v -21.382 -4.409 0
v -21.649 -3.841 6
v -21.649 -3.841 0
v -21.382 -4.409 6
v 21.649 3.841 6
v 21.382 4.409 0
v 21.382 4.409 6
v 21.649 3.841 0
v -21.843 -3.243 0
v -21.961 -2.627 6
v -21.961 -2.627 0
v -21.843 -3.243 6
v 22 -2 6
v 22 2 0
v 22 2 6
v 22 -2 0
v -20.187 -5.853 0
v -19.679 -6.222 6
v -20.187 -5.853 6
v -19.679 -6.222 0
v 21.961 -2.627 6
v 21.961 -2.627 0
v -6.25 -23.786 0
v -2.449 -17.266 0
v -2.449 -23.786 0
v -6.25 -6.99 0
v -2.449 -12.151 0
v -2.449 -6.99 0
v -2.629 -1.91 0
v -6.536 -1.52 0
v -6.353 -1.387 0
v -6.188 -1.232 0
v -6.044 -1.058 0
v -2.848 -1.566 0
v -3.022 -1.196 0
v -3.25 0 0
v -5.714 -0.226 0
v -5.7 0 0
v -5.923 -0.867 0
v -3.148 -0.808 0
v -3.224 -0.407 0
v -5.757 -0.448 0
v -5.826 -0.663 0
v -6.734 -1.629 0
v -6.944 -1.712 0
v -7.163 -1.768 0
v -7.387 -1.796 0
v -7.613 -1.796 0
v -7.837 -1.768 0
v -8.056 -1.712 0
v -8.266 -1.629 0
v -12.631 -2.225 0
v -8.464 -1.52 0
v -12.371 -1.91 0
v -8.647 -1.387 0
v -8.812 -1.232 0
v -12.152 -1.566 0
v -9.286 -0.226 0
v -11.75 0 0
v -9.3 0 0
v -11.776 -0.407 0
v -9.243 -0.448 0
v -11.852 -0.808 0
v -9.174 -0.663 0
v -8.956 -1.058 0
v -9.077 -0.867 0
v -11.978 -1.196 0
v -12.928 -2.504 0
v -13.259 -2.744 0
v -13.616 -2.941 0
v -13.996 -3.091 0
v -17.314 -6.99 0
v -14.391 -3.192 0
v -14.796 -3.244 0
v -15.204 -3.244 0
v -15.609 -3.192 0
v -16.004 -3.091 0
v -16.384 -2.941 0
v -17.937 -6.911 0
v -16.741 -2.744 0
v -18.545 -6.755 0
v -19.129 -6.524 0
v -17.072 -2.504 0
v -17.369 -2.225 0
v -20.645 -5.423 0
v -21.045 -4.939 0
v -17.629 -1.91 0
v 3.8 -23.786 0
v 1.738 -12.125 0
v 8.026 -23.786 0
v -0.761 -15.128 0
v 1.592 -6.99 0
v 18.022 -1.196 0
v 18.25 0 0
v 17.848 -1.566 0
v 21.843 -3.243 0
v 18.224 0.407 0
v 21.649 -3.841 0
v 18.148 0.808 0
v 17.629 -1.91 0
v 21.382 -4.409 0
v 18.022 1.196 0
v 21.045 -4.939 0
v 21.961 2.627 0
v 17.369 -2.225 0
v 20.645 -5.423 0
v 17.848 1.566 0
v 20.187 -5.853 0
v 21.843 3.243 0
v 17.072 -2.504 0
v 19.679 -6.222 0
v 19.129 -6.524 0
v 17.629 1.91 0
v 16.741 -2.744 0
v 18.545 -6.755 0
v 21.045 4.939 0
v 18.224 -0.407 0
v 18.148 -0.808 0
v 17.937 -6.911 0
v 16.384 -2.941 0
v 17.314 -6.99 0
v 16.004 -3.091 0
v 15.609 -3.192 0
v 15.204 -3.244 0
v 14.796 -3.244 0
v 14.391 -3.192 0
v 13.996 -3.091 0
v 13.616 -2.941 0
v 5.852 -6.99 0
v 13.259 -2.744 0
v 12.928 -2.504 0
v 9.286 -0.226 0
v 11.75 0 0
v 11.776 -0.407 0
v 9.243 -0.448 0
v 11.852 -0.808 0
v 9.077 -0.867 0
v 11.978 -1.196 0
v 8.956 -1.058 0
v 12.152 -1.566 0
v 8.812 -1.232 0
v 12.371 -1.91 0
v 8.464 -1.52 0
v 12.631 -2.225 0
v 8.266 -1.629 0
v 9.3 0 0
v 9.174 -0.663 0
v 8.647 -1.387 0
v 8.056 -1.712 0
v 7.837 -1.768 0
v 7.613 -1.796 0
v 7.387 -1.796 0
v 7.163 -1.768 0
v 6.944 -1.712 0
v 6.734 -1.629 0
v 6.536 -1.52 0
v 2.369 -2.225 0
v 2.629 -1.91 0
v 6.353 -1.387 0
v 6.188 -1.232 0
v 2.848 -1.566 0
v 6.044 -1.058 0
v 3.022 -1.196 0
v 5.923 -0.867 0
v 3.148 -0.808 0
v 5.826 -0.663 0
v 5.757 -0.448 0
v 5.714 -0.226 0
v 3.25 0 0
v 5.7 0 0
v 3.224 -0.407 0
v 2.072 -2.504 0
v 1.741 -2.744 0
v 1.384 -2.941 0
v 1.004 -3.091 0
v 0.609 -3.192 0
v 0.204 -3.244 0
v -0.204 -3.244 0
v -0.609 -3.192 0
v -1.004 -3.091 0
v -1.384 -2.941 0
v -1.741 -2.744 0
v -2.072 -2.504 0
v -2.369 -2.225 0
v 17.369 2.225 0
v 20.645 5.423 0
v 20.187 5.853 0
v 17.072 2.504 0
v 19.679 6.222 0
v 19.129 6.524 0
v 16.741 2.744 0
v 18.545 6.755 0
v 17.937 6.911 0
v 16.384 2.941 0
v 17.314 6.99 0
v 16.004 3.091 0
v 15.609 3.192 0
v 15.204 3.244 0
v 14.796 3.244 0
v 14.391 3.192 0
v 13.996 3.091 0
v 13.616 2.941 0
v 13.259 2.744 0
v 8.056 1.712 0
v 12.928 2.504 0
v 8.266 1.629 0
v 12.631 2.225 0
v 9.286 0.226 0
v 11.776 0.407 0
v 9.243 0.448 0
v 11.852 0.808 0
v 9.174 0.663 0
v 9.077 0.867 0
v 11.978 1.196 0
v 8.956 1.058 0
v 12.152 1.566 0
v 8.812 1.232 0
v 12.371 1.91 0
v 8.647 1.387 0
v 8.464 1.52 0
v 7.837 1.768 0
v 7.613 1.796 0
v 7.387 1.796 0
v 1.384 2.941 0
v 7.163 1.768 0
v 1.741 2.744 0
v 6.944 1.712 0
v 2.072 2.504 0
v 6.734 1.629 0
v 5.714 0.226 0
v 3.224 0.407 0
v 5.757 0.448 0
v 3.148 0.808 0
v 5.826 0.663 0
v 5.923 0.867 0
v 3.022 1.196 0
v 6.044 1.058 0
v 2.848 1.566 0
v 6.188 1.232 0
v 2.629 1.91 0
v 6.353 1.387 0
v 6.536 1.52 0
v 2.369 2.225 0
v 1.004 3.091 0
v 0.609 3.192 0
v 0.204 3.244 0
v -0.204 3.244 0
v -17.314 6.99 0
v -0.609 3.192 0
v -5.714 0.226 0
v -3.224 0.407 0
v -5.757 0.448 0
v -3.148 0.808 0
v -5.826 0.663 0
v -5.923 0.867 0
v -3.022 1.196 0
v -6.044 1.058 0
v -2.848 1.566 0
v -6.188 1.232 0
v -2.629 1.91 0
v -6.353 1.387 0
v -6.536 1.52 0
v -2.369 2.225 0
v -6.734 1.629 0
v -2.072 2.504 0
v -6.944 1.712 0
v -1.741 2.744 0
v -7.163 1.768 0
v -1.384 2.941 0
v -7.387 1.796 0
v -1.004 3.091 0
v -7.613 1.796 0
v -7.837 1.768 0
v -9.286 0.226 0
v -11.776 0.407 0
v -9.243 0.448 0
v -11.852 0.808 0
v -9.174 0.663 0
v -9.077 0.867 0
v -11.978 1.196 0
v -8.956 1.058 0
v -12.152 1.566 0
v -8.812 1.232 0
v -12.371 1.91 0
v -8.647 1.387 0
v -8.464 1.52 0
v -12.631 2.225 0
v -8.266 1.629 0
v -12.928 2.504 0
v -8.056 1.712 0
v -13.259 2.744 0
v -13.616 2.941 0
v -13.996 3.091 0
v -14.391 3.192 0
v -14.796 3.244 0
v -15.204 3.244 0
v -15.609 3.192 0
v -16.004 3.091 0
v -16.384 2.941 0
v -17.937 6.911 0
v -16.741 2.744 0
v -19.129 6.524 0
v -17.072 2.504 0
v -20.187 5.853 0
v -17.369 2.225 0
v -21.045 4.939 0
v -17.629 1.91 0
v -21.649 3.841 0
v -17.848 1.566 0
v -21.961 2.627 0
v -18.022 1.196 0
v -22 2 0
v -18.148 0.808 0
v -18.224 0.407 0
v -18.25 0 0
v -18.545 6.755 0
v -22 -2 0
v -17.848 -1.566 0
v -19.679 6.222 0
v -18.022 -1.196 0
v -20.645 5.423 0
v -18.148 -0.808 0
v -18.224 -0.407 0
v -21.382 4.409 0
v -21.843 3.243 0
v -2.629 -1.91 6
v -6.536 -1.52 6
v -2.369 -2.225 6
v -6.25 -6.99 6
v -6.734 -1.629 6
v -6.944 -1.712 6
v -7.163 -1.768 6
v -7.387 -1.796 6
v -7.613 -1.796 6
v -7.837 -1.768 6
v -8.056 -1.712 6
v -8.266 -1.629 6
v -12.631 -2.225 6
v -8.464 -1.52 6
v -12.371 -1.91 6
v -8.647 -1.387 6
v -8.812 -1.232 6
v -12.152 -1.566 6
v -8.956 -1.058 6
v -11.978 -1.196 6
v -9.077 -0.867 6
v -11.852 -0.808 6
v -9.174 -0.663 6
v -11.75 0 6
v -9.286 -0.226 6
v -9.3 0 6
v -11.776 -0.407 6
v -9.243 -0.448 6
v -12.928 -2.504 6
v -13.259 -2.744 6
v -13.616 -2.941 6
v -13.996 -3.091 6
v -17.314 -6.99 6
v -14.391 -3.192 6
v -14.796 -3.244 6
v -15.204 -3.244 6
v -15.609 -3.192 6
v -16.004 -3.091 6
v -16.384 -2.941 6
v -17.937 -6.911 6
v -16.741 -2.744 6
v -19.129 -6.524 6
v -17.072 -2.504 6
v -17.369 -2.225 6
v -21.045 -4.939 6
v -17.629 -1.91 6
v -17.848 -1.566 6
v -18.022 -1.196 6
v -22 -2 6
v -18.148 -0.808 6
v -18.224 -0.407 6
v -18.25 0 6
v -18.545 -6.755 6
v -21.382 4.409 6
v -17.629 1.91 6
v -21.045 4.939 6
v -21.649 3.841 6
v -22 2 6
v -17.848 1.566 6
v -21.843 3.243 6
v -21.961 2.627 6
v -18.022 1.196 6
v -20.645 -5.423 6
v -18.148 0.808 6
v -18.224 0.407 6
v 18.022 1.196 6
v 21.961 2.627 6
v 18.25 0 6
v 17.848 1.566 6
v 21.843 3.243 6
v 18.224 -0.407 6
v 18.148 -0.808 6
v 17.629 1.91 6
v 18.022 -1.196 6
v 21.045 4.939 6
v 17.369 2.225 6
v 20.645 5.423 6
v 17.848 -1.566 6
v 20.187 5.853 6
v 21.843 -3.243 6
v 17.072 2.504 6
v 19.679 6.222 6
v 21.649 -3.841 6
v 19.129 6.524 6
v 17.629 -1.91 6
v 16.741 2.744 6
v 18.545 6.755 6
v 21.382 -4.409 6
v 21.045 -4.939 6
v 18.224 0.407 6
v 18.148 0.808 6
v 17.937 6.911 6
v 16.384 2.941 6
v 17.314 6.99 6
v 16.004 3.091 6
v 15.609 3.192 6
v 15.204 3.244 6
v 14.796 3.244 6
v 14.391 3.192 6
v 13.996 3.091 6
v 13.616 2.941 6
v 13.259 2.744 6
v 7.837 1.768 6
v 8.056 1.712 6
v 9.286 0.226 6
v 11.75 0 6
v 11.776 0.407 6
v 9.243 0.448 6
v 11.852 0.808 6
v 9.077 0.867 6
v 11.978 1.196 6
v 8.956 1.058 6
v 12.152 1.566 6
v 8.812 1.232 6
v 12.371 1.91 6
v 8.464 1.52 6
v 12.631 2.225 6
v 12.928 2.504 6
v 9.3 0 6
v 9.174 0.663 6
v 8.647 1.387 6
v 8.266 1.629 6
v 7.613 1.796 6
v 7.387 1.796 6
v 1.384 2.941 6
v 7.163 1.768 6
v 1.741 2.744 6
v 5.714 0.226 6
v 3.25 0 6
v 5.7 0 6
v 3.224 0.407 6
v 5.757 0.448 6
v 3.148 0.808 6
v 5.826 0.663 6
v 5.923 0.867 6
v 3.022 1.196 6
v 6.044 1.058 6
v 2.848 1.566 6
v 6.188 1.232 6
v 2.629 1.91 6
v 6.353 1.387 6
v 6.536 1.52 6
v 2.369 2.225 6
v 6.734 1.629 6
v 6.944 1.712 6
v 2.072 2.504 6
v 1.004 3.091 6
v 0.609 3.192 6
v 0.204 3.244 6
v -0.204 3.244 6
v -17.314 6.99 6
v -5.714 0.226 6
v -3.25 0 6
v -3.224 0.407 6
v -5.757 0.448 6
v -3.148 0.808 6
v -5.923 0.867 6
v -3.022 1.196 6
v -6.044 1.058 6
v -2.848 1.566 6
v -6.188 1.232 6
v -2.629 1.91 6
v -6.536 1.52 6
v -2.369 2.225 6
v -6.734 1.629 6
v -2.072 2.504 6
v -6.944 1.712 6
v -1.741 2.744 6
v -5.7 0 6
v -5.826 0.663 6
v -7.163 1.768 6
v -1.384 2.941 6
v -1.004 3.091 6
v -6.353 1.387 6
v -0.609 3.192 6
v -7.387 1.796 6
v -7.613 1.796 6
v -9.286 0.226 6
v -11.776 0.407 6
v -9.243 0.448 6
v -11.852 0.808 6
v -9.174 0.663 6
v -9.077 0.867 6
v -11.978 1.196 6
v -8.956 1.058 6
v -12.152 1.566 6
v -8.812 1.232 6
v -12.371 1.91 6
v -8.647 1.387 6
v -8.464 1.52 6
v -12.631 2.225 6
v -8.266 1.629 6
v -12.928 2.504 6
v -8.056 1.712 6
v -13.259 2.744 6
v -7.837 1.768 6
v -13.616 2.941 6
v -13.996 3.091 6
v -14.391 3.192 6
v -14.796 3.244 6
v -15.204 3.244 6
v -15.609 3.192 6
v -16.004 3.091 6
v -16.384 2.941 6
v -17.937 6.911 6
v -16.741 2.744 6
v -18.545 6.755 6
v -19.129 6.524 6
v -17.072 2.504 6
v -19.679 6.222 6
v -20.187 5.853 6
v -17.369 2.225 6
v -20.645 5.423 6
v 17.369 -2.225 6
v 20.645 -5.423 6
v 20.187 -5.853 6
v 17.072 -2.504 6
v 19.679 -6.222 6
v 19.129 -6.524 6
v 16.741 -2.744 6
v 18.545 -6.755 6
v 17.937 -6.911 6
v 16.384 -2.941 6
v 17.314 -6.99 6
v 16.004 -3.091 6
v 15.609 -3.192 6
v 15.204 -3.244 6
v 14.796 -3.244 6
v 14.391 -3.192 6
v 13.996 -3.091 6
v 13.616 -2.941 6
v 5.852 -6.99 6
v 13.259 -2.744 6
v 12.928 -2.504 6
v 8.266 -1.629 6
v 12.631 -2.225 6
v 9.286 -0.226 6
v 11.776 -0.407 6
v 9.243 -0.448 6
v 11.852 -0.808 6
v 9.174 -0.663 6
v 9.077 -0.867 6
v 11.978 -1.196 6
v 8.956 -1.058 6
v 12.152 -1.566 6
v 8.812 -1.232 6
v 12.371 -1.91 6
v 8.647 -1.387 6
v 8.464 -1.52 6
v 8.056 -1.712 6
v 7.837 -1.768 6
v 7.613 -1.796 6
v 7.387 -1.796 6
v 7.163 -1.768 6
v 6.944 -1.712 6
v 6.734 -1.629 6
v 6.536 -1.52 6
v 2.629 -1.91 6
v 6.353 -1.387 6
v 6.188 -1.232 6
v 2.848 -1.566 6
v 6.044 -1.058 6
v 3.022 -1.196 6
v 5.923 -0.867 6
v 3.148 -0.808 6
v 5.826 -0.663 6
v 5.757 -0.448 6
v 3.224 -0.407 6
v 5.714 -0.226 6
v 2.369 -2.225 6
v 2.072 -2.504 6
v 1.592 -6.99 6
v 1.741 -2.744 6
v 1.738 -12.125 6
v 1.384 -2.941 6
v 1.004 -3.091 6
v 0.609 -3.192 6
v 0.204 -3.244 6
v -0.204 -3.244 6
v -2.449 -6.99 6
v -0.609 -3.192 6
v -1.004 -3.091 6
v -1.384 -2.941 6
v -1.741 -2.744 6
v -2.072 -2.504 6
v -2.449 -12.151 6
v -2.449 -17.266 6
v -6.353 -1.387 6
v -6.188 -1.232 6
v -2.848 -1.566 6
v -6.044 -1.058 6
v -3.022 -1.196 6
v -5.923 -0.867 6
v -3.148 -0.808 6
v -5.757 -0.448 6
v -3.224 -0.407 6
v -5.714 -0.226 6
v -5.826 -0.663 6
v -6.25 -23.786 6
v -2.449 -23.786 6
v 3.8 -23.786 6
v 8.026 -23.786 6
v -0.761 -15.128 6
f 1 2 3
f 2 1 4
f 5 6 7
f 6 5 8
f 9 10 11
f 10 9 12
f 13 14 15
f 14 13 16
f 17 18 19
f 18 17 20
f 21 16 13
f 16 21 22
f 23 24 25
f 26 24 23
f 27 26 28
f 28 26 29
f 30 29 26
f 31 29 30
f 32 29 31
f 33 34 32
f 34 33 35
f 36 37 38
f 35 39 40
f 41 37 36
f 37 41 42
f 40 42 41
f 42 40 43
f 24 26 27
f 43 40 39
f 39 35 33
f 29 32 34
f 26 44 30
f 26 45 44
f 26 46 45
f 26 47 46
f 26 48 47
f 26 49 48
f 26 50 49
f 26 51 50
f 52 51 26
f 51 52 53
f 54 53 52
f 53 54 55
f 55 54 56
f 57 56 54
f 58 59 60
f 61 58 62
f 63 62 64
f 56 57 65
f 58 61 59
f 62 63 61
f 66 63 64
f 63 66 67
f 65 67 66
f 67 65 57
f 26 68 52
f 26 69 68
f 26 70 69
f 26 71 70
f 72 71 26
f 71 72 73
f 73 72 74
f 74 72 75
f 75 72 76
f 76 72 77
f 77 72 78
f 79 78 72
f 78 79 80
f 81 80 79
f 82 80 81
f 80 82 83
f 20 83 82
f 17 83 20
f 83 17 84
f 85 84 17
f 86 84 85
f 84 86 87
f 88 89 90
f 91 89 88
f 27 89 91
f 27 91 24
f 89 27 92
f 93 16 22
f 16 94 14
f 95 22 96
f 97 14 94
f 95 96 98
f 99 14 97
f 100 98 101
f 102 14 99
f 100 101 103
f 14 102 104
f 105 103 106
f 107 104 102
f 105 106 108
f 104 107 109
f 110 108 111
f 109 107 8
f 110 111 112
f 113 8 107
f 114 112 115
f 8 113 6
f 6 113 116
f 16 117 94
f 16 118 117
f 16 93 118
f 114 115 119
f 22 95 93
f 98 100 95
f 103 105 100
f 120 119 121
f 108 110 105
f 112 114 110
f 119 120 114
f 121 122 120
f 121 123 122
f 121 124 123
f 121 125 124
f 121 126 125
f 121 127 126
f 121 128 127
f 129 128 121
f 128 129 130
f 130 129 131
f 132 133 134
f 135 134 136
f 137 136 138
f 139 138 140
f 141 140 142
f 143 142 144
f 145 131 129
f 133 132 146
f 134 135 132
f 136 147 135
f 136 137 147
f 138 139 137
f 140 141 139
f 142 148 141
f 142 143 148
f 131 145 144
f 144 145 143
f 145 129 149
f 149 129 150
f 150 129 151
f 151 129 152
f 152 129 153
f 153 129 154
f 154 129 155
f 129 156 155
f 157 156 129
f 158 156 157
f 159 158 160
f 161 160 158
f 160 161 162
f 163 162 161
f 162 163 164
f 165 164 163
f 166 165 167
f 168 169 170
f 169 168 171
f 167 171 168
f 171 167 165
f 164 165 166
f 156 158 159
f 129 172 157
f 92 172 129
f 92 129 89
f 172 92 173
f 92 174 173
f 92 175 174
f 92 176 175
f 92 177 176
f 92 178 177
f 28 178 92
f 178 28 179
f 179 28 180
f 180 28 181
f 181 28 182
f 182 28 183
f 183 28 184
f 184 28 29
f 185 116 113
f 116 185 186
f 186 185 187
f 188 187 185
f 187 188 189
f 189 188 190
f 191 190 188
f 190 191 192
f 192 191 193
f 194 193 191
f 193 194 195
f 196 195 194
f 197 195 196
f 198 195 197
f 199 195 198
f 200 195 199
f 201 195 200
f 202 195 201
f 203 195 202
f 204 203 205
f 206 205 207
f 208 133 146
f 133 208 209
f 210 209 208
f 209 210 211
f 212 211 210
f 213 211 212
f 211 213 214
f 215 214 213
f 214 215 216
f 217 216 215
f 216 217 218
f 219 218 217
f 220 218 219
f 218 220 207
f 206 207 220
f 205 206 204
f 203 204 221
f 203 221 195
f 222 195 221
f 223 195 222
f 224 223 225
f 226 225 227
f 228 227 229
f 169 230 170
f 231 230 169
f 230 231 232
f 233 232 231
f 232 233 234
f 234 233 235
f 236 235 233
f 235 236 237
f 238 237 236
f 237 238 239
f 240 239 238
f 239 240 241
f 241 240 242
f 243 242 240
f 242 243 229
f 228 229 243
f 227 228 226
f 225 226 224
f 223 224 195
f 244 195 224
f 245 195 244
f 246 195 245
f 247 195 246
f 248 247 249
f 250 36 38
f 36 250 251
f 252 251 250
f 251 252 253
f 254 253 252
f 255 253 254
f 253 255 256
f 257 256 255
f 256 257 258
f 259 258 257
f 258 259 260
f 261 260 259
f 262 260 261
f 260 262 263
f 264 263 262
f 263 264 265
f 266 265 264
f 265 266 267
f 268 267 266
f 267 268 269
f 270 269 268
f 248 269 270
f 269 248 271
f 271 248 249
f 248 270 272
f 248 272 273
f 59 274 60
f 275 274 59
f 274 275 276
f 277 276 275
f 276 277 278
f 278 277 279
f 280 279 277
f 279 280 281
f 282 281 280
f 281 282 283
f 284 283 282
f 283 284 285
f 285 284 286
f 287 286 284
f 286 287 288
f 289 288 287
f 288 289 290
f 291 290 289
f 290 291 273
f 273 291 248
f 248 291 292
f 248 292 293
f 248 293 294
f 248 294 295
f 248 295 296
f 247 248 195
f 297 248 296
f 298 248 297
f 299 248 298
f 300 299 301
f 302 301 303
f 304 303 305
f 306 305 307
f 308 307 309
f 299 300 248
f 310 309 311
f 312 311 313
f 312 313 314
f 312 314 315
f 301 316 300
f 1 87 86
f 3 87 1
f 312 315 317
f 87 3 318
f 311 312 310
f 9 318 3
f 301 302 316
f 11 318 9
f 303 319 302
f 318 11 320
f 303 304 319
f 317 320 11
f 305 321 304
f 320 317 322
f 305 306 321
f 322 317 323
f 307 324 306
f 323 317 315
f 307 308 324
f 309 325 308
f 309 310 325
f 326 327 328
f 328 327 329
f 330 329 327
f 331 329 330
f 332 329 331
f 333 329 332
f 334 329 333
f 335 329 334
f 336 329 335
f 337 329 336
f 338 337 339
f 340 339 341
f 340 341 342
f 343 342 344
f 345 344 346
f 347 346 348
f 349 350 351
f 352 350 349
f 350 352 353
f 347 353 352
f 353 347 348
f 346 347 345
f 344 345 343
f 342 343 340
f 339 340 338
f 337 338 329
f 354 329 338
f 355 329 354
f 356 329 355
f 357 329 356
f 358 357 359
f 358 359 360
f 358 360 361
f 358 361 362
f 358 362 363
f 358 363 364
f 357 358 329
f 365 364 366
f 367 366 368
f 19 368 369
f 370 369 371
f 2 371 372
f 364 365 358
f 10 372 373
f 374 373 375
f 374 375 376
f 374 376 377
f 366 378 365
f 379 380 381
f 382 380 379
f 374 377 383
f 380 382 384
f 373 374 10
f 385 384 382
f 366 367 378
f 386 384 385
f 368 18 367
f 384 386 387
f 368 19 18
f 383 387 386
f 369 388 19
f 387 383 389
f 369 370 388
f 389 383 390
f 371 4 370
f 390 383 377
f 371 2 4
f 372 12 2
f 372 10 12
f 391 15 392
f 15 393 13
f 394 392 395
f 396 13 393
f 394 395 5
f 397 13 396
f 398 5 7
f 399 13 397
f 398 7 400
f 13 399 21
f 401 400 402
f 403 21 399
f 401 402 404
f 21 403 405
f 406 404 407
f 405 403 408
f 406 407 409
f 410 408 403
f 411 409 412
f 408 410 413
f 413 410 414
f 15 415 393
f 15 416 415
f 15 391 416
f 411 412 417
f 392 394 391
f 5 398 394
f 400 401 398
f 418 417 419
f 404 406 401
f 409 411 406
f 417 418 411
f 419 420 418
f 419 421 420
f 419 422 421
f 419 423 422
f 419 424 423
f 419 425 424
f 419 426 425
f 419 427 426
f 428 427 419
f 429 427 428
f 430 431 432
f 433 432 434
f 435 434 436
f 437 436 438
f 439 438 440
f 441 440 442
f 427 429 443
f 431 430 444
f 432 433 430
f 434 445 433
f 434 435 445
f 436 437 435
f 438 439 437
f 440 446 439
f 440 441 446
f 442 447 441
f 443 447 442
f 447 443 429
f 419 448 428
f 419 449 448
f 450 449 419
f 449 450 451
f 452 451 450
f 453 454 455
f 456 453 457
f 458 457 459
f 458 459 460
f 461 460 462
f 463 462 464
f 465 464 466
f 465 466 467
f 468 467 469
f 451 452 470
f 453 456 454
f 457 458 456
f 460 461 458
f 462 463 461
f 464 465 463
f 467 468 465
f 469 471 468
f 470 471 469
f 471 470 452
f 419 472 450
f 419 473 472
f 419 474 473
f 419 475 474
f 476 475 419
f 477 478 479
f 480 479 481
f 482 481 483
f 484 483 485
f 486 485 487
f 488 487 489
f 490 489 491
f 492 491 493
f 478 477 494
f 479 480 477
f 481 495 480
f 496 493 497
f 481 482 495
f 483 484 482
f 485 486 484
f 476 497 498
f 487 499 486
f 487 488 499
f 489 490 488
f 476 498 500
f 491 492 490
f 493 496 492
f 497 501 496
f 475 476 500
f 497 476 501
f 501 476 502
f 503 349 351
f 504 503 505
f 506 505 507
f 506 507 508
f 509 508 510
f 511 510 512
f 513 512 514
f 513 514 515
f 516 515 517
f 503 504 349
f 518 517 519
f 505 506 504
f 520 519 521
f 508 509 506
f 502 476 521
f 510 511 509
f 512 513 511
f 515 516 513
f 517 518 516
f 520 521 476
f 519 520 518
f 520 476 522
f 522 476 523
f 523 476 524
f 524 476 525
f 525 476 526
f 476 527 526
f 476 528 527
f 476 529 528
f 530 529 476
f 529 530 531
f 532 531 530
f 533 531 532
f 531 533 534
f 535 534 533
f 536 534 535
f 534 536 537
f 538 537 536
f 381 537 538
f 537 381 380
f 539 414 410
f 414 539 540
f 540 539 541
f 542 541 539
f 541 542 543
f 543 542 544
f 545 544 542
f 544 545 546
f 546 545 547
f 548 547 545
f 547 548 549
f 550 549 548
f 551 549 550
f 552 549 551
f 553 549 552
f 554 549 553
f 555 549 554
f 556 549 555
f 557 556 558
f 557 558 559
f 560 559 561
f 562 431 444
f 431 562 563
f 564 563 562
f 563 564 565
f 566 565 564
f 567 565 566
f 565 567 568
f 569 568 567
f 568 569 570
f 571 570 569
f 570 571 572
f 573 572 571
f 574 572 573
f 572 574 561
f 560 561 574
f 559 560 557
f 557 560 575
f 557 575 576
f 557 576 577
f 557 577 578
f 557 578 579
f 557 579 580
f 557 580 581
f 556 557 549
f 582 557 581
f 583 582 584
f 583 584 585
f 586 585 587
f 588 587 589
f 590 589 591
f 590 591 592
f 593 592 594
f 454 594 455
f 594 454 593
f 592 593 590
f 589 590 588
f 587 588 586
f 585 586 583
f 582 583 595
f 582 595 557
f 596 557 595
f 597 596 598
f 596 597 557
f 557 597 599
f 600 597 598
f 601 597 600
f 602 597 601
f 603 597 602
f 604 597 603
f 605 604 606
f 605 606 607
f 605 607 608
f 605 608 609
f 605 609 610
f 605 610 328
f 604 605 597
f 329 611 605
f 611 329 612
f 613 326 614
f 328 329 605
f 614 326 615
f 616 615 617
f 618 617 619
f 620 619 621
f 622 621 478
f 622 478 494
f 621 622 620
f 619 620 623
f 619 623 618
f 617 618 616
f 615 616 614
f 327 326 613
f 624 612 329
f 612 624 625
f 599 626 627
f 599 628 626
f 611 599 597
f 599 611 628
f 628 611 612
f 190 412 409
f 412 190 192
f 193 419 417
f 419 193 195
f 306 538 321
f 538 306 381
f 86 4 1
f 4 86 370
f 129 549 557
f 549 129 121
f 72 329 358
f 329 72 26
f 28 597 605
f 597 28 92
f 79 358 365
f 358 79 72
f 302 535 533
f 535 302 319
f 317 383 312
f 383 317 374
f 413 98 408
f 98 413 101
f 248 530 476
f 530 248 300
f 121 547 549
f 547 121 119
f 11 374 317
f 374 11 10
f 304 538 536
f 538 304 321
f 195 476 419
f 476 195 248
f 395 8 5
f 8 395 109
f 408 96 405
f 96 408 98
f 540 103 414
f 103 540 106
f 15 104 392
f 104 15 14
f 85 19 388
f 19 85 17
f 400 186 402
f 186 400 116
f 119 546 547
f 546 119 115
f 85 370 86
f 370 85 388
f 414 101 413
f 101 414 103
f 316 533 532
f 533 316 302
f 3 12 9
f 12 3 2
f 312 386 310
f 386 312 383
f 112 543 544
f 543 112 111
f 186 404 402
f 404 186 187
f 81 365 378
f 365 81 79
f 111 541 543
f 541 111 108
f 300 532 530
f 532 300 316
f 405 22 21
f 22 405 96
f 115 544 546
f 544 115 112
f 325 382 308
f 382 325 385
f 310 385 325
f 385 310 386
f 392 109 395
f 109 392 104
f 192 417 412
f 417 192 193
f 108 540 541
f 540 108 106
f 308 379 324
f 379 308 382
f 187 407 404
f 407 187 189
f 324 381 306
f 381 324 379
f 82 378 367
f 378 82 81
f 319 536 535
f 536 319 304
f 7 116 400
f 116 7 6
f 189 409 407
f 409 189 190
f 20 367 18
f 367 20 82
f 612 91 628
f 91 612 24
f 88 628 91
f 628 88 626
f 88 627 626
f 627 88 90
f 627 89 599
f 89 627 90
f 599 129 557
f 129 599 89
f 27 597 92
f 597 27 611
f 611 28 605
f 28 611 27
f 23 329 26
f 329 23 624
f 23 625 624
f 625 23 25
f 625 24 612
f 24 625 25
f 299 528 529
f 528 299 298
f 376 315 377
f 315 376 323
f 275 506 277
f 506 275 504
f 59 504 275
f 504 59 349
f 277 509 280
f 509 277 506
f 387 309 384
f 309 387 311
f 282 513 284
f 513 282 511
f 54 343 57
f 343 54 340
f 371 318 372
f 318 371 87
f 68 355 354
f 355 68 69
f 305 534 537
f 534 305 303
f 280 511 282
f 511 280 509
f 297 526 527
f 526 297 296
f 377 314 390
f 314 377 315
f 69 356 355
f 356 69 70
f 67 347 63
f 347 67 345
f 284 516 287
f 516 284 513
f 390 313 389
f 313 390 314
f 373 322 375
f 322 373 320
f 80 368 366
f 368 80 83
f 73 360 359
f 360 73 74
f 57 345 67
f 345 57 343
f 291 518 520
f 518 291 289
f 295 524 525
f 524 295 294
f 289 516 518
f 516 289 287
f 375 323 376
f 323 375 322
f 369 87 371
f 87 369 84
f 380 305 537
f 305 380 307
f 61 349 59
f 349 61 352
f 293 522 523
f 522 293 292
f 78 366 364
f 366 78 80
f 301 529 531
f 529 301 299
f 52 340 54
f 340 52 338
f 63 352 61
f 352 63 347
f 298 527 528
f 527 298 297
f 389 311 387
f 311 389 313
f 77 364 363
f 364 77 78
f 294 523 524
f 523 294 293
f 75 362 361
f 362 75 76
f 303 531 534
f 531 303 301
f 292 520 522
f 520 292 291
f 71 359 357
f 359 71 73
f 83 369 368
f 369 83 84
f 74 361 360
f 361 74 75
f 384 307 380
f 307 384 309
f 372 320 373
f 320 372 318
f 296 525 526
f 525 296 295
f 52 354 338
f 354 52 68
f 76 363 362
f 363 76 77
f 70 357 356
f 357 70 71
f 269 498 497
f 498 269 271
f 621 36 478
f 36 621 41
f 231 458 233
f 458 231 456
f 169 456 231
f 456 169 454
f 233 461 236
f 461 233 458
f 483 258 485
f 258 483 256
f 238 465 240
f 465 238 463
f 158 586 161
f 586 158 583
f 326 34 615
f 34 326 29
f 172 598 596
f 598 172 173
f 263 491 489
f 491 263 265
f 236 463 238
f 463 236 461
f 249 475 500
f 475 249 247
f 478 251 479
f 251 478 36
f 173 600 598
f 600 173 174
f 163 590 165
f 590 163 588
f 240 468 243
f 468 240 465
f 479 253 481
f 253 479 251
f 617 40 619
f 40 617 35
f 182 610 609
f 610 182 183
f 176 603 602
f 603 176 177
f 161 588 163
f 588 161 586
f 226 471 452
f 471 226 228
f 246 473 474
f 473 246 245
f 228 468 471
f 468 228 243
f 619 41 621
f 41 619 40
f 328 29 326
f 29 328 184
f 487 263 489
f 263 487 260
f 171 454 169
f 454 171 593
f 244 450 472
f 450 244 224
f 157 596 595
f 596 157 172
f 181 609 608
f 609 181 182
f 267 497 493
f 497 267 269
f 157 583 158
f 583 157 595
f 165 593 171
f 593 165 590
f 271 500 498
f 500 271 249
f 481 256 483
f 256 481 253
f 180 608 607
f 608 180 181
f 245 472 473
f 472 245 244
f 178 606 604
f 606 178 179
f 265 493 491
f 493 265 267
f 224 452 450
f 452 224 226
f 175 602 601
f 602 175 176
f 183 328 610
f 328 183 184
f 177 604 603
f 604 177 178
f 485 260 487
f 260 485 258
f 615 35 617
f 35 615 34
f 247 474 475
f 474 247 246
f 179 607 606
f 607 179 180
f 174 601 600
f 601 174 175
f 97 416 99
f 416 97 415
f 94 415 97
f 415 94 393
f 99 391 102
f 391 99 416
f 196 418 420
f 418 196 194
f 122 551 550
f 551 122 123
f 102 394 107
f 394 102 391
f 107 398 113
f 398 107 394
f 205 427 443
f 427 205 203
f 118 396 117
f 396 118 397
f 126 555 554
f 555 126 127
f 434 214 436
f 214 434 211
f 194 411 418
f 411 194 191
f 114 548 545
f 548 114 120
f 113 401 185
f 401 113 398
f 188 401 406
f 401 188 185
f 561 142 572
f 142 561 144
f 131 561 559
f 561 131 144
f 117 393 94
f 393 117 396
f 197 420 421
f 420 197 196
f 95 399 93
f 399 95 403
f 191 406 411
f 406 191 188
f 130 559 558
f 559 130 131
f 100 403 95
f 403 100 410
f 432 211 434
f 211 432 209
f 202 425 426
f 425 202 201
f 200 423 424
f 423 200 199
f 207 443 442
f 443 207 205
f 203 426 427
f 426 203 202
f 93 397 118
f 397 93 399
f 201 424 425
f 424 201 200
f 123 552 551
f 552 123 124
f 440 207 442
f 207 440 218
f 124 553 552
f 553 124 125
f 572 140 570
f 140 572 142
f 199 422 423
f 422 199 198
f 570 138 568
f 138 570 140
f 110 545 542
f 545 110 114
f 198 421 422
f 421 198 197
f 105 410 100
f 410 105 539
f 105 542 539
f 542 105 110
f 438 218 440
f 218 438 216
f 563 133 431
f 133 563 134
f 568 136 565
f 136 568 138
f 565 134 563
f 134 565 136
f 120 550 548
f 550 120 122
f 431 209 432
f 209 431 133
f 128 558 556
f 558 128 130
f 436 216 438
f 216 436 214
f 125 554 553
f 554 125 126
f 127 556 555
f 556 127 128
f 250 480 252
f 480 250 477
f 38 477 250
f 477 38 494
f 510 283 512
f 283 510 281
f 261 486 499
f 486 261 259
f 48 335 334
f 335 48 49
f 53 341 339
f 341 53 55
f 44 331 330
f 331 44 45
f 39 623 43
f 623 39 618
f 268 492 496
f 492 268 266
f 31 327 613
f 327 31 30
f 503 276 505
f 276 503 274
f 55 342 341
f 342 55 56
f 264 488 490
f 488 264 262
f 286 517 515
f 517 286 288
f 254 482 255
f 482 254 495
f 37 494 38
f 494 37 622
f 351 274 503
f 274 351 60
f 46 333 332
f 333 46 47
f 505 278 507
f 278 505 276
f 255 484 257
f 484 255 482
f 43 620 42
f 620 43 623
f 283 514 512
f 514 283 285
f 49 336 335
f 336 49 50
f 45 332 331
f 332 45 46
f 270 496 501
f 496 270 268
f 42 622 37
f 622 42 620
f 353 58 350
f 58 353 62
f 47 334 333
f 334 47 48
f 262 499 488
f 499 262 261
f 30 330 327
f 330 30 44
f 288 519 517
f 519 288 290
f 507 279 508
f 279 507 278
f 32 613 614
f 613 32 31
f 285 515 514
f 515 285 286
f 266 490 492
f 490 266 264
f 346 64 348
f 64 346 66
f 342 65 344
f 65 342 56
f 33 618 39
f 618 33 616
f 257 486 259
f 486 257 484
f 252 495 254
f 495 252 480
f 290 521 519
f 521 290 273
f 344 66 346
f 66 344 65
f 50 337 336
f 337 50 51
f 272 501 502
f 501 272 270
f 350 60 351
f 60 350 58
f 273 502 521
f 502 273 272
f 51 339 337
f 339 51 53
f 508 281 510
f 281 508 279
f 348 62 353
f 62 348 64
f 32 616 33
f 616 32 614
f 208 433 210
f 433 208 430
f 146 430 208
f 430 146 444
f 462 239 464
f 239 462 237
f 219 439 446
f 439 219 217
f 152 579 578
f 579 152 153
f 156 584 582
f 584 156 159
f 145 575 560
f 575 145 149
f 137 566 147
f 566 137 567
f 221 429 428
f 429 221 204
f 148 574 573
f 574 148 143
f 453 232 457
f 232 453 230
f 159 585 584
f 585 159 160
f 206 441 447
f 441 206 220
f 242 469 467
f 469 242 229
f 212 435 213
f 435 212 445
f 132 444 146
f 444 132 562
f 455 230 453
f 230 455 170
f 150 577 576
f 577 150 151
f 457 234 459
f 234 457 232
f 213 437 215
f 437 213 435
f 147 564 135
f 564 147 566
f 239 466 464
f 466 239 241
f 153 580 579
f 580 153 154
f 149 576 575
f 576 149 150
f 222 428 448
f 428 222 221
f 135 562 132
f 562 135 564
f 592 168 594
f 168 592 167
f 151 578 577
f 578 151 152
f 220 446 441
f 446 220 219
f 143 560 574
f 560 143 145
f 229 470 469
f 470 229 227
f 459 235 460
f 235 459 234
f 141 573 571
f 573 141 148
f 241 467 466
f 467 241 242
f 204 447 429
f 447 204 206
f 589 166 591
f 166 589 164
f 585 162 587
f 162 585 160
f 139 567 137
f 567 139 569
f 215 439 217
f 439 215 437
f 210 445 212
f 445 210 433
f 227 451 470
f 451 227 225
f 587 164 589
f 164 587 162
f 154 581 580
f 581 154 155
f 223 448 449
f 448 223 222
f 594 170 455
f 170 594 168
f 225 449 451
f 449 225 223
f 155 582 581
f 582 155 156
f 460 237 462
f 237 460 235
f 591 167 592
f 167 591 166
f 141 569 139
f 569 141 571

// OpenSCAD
$fn = 50;


difference() {
	union() {
		hull() {
			translate(v = [-17.0000000000, 2.0000000000, 0]) {
				cylinder(h = 6, r = 5);
			}
			translate(v = [17.0000000000, 2.0000000000, 0]) {
				cylinder(h = 6, r = 5);
			}
			translate(v = [-17.0000000000, -2.0000000000, 0]) {
				cylinder(h = 6, r = 5);
			}
			translate(v = [17.0000000000, -2.0000000000, 0]) {
				cylinder(h = 6, r = 5);
			}
		}
		translate(v = [0, -5, 0]) {
			linear_extrude(height = 6) {
				text(font = "DejaVu Sans Mono:style=Bold", halign = "center", size = 19.0000000000, text = "K", valign = "top");
			}
		}
	}
	union() {
		translate(v = [-15.0000000000, 0.0000000000, 0]) {
			translate(v = [0, 0, -100]) {
				cylinder(h = 200, r = 3.2500000000);
			}
		}
		translate(v = [0, 0, -100]) {
			cylinder(h = 200, r = 3.2500000000);
		}
		translate(v = [15.0000000000, 0.0000000000, 0]) {
			translate(v = [0, 0, -100]) {
				cylinder(h = 200, r = 3.2500000000);
			}
		}
		translate(v = [-15.0000000000, 0.0000000000, 0]) {
			translate(v = [0, 0, -100]) {
				cylinder(h = 200, r = 1.8000000000);
			}
		}
		translate(v = [-7.5000000000, 0.0000000000, 0]) {
			translate(v = [0, 0, -100]) {
				cylinder(h = 200, r = 1.8000000000);
			}
		}
		translate(v = [0, 0, -100]) {
			cylinder(h = 200, r = 1.8000000000);
		}
		translate(v = [7.5000000000, 0.0000000000, 0]) {
			translate(v = [0, 0, -100]) {
				cylinder(h = 200, r = 1.8000000000);
			}
		}
		translate(v = [15.0000000000, 0.0000000000, 0]) {
			translate(v = [0, 0, -100]) {
				cylinder(h = 200, r = 1.8000000000);
			}
		}
	}
}
